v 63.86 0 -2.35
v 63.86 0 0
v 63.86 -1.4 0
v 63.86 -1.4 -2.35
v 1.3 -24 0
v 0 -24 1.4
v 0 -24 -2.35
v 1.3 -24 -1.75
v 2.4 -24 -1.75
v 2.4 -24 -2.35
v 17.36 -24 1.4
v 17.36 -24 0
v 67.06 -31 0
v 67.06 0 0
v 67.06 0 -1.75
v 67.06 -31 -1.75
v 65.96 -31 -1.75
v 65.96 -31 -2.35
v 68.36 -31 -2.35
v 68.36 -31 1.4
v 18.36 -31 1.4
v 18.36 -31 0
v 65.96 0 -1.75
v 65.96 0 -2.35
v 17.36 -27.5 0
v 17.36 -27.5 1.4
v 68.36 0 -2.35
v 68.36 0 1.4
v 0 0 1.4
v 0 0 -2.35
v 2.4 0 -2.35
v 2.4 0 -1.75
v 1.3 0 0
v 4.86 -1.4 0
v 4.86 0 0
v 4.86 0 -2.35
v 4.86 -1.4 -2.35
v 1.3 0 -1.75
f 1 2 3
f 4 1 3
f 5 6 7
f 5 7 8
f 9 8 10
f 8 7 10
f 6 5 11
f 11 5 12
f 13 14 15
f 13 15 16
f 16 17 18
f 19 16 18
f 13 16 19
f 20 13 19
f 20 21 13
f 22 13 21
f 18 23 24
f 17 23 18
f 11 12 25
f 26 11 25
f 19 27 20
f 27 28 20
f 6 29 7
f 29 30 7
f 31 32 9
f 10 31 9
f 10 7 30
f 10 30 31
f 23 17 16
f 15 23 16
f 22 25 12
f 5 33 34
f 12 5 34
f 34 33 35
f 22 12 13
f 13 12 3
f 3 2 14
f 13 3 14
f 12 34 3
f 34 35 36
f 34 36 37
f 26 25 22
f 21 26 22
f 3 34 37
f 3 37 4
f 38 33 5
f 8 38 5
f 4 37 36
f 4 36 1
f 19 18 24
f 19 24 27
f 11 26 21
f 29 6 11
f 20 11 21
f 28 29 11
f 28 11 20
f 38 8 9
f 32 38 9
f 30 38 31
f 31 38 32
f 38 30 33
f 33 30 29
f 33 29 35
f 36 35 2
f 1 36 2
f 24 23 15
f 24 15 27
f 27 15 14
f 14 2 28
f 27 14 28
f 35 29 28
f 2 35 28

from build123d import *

# Parameters (mm, degrees)
F1_DEPTH = 1.4
F2_W     = 1.3
F2_H     = 31
F2_H_2   = 24
F2_W_2   = 59
F2_H_3   = 1.4
F3_DEPTH = 1.75
F4_W     = 2.4
F4_H     = 31
F4_H_2   = 24
F4_W_2   = 59
F4_H_3   = 1.4
F5_DEPTH = 0.6


with BuildPart() as f1:
    # F0 (on Top) → F1 (new body)
    with BuildSketch(Plane.XY):
        Polygon((68.36, 0), (0, 0), (0, -24), (17.36, -24), (17.36, -27.5), (18.36, -31), (68.36, -31), align=None)
    extrude(amount=F1_DEPTH)

    # F2 (on face) → F3 (join)
    with BuildSketch(Plane(origin=(0, 0, 0), x_dir=(1, 0, 0), z_dir=(0, 0, -1))):
        with Locations((67.71, 15.5)):
            Rectangle(F2_W, F2_H)
        with Locations((0.65, 12)):
            Rectangle(F2_W, F2_H_2)
        with Locations((34.36, 0.7)):
            Rectangle(F2_W_2, F2_H_3)
    extrude(amount=F3_DEPTH)

    # F4 (on face) → F5 (join)
    with BuildSketch(Plane(origin=(0, 0, -1.75), x_dir=(1, 0, 0), z_dir=(0, 0, -1))):
        with Locations((67.16, 15.5)):
            Rectangle(F4_W, F4_H)
        with Locations((1.2, 12)):
            Rectangle(F4_W, F4_H_2)
        with Locations((34.36, 0.7)):
            Rectangle(F4_W_2, F4_H_3)
    extrude(amount=F5_DEPTH)


solid = f1.part
